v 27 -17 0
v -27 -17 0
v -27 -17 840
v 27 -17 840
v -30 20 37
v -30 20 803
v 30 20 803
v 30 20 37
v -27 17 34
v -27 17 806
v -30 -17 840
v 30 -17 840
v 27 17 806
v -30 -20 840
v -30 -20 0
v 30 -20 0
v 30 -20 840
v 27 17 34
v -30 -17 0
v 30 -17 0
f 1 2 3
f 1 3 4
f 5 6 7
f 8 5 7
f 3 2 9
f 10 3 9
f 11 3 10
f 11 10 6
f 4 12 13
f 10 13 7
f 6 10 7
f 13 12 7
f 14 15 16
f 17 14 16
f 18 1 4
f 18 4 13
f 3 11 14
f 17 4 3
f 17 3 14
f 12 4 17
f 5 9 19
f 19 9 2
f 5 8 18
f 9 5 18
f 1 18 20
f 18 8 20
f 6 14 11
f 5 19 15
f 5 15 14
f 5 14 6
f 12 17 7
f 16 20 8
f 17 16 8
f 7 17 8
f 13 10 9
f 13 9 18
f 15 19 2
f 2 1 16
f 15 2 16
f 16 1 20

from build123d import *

# Parameters (mm, degrees)
F0_W     = 60
F0_H     = 40
F0_W_2   = 54
F0_H_2   = 34
F1_DEPTH = 840
F3_DEPTH = 60
F4_DEPTH = 60


with BuildPart() as f1:
    # F0 (on Top) → F1 (new body)
    with BuildSketch(Plane.XY):
        Rectangle(F0_W, F0_H)
        Rectangle(F0_W_2, F0_H_2, mode=Mode.SUBTRACT)
    extrude(amount=F1_DEPTH)

    # F2 (on face) → F3 (cut)
    with BuildSketch(Plane.YZ.offset(30)):
        Polygon((20, 840), (-17, 840), (20, 803), align=None)
        Polygon((-17, 0), (20, 0), (20, 37), align=None)
    extrude(amount=-F3_DEPTH, mode=Mode.SUBTRACT)

    # F2 (on face) → F4 (cut)
    with BuildSketch(Plane.YZ.offset(30)):
        Polygon((20, 0), (20, 37), (-17, 0), align=None)
    extrude(amount=-F4_DEPTH, mode=Mode.SUBTRACT)


solid = f1.part
